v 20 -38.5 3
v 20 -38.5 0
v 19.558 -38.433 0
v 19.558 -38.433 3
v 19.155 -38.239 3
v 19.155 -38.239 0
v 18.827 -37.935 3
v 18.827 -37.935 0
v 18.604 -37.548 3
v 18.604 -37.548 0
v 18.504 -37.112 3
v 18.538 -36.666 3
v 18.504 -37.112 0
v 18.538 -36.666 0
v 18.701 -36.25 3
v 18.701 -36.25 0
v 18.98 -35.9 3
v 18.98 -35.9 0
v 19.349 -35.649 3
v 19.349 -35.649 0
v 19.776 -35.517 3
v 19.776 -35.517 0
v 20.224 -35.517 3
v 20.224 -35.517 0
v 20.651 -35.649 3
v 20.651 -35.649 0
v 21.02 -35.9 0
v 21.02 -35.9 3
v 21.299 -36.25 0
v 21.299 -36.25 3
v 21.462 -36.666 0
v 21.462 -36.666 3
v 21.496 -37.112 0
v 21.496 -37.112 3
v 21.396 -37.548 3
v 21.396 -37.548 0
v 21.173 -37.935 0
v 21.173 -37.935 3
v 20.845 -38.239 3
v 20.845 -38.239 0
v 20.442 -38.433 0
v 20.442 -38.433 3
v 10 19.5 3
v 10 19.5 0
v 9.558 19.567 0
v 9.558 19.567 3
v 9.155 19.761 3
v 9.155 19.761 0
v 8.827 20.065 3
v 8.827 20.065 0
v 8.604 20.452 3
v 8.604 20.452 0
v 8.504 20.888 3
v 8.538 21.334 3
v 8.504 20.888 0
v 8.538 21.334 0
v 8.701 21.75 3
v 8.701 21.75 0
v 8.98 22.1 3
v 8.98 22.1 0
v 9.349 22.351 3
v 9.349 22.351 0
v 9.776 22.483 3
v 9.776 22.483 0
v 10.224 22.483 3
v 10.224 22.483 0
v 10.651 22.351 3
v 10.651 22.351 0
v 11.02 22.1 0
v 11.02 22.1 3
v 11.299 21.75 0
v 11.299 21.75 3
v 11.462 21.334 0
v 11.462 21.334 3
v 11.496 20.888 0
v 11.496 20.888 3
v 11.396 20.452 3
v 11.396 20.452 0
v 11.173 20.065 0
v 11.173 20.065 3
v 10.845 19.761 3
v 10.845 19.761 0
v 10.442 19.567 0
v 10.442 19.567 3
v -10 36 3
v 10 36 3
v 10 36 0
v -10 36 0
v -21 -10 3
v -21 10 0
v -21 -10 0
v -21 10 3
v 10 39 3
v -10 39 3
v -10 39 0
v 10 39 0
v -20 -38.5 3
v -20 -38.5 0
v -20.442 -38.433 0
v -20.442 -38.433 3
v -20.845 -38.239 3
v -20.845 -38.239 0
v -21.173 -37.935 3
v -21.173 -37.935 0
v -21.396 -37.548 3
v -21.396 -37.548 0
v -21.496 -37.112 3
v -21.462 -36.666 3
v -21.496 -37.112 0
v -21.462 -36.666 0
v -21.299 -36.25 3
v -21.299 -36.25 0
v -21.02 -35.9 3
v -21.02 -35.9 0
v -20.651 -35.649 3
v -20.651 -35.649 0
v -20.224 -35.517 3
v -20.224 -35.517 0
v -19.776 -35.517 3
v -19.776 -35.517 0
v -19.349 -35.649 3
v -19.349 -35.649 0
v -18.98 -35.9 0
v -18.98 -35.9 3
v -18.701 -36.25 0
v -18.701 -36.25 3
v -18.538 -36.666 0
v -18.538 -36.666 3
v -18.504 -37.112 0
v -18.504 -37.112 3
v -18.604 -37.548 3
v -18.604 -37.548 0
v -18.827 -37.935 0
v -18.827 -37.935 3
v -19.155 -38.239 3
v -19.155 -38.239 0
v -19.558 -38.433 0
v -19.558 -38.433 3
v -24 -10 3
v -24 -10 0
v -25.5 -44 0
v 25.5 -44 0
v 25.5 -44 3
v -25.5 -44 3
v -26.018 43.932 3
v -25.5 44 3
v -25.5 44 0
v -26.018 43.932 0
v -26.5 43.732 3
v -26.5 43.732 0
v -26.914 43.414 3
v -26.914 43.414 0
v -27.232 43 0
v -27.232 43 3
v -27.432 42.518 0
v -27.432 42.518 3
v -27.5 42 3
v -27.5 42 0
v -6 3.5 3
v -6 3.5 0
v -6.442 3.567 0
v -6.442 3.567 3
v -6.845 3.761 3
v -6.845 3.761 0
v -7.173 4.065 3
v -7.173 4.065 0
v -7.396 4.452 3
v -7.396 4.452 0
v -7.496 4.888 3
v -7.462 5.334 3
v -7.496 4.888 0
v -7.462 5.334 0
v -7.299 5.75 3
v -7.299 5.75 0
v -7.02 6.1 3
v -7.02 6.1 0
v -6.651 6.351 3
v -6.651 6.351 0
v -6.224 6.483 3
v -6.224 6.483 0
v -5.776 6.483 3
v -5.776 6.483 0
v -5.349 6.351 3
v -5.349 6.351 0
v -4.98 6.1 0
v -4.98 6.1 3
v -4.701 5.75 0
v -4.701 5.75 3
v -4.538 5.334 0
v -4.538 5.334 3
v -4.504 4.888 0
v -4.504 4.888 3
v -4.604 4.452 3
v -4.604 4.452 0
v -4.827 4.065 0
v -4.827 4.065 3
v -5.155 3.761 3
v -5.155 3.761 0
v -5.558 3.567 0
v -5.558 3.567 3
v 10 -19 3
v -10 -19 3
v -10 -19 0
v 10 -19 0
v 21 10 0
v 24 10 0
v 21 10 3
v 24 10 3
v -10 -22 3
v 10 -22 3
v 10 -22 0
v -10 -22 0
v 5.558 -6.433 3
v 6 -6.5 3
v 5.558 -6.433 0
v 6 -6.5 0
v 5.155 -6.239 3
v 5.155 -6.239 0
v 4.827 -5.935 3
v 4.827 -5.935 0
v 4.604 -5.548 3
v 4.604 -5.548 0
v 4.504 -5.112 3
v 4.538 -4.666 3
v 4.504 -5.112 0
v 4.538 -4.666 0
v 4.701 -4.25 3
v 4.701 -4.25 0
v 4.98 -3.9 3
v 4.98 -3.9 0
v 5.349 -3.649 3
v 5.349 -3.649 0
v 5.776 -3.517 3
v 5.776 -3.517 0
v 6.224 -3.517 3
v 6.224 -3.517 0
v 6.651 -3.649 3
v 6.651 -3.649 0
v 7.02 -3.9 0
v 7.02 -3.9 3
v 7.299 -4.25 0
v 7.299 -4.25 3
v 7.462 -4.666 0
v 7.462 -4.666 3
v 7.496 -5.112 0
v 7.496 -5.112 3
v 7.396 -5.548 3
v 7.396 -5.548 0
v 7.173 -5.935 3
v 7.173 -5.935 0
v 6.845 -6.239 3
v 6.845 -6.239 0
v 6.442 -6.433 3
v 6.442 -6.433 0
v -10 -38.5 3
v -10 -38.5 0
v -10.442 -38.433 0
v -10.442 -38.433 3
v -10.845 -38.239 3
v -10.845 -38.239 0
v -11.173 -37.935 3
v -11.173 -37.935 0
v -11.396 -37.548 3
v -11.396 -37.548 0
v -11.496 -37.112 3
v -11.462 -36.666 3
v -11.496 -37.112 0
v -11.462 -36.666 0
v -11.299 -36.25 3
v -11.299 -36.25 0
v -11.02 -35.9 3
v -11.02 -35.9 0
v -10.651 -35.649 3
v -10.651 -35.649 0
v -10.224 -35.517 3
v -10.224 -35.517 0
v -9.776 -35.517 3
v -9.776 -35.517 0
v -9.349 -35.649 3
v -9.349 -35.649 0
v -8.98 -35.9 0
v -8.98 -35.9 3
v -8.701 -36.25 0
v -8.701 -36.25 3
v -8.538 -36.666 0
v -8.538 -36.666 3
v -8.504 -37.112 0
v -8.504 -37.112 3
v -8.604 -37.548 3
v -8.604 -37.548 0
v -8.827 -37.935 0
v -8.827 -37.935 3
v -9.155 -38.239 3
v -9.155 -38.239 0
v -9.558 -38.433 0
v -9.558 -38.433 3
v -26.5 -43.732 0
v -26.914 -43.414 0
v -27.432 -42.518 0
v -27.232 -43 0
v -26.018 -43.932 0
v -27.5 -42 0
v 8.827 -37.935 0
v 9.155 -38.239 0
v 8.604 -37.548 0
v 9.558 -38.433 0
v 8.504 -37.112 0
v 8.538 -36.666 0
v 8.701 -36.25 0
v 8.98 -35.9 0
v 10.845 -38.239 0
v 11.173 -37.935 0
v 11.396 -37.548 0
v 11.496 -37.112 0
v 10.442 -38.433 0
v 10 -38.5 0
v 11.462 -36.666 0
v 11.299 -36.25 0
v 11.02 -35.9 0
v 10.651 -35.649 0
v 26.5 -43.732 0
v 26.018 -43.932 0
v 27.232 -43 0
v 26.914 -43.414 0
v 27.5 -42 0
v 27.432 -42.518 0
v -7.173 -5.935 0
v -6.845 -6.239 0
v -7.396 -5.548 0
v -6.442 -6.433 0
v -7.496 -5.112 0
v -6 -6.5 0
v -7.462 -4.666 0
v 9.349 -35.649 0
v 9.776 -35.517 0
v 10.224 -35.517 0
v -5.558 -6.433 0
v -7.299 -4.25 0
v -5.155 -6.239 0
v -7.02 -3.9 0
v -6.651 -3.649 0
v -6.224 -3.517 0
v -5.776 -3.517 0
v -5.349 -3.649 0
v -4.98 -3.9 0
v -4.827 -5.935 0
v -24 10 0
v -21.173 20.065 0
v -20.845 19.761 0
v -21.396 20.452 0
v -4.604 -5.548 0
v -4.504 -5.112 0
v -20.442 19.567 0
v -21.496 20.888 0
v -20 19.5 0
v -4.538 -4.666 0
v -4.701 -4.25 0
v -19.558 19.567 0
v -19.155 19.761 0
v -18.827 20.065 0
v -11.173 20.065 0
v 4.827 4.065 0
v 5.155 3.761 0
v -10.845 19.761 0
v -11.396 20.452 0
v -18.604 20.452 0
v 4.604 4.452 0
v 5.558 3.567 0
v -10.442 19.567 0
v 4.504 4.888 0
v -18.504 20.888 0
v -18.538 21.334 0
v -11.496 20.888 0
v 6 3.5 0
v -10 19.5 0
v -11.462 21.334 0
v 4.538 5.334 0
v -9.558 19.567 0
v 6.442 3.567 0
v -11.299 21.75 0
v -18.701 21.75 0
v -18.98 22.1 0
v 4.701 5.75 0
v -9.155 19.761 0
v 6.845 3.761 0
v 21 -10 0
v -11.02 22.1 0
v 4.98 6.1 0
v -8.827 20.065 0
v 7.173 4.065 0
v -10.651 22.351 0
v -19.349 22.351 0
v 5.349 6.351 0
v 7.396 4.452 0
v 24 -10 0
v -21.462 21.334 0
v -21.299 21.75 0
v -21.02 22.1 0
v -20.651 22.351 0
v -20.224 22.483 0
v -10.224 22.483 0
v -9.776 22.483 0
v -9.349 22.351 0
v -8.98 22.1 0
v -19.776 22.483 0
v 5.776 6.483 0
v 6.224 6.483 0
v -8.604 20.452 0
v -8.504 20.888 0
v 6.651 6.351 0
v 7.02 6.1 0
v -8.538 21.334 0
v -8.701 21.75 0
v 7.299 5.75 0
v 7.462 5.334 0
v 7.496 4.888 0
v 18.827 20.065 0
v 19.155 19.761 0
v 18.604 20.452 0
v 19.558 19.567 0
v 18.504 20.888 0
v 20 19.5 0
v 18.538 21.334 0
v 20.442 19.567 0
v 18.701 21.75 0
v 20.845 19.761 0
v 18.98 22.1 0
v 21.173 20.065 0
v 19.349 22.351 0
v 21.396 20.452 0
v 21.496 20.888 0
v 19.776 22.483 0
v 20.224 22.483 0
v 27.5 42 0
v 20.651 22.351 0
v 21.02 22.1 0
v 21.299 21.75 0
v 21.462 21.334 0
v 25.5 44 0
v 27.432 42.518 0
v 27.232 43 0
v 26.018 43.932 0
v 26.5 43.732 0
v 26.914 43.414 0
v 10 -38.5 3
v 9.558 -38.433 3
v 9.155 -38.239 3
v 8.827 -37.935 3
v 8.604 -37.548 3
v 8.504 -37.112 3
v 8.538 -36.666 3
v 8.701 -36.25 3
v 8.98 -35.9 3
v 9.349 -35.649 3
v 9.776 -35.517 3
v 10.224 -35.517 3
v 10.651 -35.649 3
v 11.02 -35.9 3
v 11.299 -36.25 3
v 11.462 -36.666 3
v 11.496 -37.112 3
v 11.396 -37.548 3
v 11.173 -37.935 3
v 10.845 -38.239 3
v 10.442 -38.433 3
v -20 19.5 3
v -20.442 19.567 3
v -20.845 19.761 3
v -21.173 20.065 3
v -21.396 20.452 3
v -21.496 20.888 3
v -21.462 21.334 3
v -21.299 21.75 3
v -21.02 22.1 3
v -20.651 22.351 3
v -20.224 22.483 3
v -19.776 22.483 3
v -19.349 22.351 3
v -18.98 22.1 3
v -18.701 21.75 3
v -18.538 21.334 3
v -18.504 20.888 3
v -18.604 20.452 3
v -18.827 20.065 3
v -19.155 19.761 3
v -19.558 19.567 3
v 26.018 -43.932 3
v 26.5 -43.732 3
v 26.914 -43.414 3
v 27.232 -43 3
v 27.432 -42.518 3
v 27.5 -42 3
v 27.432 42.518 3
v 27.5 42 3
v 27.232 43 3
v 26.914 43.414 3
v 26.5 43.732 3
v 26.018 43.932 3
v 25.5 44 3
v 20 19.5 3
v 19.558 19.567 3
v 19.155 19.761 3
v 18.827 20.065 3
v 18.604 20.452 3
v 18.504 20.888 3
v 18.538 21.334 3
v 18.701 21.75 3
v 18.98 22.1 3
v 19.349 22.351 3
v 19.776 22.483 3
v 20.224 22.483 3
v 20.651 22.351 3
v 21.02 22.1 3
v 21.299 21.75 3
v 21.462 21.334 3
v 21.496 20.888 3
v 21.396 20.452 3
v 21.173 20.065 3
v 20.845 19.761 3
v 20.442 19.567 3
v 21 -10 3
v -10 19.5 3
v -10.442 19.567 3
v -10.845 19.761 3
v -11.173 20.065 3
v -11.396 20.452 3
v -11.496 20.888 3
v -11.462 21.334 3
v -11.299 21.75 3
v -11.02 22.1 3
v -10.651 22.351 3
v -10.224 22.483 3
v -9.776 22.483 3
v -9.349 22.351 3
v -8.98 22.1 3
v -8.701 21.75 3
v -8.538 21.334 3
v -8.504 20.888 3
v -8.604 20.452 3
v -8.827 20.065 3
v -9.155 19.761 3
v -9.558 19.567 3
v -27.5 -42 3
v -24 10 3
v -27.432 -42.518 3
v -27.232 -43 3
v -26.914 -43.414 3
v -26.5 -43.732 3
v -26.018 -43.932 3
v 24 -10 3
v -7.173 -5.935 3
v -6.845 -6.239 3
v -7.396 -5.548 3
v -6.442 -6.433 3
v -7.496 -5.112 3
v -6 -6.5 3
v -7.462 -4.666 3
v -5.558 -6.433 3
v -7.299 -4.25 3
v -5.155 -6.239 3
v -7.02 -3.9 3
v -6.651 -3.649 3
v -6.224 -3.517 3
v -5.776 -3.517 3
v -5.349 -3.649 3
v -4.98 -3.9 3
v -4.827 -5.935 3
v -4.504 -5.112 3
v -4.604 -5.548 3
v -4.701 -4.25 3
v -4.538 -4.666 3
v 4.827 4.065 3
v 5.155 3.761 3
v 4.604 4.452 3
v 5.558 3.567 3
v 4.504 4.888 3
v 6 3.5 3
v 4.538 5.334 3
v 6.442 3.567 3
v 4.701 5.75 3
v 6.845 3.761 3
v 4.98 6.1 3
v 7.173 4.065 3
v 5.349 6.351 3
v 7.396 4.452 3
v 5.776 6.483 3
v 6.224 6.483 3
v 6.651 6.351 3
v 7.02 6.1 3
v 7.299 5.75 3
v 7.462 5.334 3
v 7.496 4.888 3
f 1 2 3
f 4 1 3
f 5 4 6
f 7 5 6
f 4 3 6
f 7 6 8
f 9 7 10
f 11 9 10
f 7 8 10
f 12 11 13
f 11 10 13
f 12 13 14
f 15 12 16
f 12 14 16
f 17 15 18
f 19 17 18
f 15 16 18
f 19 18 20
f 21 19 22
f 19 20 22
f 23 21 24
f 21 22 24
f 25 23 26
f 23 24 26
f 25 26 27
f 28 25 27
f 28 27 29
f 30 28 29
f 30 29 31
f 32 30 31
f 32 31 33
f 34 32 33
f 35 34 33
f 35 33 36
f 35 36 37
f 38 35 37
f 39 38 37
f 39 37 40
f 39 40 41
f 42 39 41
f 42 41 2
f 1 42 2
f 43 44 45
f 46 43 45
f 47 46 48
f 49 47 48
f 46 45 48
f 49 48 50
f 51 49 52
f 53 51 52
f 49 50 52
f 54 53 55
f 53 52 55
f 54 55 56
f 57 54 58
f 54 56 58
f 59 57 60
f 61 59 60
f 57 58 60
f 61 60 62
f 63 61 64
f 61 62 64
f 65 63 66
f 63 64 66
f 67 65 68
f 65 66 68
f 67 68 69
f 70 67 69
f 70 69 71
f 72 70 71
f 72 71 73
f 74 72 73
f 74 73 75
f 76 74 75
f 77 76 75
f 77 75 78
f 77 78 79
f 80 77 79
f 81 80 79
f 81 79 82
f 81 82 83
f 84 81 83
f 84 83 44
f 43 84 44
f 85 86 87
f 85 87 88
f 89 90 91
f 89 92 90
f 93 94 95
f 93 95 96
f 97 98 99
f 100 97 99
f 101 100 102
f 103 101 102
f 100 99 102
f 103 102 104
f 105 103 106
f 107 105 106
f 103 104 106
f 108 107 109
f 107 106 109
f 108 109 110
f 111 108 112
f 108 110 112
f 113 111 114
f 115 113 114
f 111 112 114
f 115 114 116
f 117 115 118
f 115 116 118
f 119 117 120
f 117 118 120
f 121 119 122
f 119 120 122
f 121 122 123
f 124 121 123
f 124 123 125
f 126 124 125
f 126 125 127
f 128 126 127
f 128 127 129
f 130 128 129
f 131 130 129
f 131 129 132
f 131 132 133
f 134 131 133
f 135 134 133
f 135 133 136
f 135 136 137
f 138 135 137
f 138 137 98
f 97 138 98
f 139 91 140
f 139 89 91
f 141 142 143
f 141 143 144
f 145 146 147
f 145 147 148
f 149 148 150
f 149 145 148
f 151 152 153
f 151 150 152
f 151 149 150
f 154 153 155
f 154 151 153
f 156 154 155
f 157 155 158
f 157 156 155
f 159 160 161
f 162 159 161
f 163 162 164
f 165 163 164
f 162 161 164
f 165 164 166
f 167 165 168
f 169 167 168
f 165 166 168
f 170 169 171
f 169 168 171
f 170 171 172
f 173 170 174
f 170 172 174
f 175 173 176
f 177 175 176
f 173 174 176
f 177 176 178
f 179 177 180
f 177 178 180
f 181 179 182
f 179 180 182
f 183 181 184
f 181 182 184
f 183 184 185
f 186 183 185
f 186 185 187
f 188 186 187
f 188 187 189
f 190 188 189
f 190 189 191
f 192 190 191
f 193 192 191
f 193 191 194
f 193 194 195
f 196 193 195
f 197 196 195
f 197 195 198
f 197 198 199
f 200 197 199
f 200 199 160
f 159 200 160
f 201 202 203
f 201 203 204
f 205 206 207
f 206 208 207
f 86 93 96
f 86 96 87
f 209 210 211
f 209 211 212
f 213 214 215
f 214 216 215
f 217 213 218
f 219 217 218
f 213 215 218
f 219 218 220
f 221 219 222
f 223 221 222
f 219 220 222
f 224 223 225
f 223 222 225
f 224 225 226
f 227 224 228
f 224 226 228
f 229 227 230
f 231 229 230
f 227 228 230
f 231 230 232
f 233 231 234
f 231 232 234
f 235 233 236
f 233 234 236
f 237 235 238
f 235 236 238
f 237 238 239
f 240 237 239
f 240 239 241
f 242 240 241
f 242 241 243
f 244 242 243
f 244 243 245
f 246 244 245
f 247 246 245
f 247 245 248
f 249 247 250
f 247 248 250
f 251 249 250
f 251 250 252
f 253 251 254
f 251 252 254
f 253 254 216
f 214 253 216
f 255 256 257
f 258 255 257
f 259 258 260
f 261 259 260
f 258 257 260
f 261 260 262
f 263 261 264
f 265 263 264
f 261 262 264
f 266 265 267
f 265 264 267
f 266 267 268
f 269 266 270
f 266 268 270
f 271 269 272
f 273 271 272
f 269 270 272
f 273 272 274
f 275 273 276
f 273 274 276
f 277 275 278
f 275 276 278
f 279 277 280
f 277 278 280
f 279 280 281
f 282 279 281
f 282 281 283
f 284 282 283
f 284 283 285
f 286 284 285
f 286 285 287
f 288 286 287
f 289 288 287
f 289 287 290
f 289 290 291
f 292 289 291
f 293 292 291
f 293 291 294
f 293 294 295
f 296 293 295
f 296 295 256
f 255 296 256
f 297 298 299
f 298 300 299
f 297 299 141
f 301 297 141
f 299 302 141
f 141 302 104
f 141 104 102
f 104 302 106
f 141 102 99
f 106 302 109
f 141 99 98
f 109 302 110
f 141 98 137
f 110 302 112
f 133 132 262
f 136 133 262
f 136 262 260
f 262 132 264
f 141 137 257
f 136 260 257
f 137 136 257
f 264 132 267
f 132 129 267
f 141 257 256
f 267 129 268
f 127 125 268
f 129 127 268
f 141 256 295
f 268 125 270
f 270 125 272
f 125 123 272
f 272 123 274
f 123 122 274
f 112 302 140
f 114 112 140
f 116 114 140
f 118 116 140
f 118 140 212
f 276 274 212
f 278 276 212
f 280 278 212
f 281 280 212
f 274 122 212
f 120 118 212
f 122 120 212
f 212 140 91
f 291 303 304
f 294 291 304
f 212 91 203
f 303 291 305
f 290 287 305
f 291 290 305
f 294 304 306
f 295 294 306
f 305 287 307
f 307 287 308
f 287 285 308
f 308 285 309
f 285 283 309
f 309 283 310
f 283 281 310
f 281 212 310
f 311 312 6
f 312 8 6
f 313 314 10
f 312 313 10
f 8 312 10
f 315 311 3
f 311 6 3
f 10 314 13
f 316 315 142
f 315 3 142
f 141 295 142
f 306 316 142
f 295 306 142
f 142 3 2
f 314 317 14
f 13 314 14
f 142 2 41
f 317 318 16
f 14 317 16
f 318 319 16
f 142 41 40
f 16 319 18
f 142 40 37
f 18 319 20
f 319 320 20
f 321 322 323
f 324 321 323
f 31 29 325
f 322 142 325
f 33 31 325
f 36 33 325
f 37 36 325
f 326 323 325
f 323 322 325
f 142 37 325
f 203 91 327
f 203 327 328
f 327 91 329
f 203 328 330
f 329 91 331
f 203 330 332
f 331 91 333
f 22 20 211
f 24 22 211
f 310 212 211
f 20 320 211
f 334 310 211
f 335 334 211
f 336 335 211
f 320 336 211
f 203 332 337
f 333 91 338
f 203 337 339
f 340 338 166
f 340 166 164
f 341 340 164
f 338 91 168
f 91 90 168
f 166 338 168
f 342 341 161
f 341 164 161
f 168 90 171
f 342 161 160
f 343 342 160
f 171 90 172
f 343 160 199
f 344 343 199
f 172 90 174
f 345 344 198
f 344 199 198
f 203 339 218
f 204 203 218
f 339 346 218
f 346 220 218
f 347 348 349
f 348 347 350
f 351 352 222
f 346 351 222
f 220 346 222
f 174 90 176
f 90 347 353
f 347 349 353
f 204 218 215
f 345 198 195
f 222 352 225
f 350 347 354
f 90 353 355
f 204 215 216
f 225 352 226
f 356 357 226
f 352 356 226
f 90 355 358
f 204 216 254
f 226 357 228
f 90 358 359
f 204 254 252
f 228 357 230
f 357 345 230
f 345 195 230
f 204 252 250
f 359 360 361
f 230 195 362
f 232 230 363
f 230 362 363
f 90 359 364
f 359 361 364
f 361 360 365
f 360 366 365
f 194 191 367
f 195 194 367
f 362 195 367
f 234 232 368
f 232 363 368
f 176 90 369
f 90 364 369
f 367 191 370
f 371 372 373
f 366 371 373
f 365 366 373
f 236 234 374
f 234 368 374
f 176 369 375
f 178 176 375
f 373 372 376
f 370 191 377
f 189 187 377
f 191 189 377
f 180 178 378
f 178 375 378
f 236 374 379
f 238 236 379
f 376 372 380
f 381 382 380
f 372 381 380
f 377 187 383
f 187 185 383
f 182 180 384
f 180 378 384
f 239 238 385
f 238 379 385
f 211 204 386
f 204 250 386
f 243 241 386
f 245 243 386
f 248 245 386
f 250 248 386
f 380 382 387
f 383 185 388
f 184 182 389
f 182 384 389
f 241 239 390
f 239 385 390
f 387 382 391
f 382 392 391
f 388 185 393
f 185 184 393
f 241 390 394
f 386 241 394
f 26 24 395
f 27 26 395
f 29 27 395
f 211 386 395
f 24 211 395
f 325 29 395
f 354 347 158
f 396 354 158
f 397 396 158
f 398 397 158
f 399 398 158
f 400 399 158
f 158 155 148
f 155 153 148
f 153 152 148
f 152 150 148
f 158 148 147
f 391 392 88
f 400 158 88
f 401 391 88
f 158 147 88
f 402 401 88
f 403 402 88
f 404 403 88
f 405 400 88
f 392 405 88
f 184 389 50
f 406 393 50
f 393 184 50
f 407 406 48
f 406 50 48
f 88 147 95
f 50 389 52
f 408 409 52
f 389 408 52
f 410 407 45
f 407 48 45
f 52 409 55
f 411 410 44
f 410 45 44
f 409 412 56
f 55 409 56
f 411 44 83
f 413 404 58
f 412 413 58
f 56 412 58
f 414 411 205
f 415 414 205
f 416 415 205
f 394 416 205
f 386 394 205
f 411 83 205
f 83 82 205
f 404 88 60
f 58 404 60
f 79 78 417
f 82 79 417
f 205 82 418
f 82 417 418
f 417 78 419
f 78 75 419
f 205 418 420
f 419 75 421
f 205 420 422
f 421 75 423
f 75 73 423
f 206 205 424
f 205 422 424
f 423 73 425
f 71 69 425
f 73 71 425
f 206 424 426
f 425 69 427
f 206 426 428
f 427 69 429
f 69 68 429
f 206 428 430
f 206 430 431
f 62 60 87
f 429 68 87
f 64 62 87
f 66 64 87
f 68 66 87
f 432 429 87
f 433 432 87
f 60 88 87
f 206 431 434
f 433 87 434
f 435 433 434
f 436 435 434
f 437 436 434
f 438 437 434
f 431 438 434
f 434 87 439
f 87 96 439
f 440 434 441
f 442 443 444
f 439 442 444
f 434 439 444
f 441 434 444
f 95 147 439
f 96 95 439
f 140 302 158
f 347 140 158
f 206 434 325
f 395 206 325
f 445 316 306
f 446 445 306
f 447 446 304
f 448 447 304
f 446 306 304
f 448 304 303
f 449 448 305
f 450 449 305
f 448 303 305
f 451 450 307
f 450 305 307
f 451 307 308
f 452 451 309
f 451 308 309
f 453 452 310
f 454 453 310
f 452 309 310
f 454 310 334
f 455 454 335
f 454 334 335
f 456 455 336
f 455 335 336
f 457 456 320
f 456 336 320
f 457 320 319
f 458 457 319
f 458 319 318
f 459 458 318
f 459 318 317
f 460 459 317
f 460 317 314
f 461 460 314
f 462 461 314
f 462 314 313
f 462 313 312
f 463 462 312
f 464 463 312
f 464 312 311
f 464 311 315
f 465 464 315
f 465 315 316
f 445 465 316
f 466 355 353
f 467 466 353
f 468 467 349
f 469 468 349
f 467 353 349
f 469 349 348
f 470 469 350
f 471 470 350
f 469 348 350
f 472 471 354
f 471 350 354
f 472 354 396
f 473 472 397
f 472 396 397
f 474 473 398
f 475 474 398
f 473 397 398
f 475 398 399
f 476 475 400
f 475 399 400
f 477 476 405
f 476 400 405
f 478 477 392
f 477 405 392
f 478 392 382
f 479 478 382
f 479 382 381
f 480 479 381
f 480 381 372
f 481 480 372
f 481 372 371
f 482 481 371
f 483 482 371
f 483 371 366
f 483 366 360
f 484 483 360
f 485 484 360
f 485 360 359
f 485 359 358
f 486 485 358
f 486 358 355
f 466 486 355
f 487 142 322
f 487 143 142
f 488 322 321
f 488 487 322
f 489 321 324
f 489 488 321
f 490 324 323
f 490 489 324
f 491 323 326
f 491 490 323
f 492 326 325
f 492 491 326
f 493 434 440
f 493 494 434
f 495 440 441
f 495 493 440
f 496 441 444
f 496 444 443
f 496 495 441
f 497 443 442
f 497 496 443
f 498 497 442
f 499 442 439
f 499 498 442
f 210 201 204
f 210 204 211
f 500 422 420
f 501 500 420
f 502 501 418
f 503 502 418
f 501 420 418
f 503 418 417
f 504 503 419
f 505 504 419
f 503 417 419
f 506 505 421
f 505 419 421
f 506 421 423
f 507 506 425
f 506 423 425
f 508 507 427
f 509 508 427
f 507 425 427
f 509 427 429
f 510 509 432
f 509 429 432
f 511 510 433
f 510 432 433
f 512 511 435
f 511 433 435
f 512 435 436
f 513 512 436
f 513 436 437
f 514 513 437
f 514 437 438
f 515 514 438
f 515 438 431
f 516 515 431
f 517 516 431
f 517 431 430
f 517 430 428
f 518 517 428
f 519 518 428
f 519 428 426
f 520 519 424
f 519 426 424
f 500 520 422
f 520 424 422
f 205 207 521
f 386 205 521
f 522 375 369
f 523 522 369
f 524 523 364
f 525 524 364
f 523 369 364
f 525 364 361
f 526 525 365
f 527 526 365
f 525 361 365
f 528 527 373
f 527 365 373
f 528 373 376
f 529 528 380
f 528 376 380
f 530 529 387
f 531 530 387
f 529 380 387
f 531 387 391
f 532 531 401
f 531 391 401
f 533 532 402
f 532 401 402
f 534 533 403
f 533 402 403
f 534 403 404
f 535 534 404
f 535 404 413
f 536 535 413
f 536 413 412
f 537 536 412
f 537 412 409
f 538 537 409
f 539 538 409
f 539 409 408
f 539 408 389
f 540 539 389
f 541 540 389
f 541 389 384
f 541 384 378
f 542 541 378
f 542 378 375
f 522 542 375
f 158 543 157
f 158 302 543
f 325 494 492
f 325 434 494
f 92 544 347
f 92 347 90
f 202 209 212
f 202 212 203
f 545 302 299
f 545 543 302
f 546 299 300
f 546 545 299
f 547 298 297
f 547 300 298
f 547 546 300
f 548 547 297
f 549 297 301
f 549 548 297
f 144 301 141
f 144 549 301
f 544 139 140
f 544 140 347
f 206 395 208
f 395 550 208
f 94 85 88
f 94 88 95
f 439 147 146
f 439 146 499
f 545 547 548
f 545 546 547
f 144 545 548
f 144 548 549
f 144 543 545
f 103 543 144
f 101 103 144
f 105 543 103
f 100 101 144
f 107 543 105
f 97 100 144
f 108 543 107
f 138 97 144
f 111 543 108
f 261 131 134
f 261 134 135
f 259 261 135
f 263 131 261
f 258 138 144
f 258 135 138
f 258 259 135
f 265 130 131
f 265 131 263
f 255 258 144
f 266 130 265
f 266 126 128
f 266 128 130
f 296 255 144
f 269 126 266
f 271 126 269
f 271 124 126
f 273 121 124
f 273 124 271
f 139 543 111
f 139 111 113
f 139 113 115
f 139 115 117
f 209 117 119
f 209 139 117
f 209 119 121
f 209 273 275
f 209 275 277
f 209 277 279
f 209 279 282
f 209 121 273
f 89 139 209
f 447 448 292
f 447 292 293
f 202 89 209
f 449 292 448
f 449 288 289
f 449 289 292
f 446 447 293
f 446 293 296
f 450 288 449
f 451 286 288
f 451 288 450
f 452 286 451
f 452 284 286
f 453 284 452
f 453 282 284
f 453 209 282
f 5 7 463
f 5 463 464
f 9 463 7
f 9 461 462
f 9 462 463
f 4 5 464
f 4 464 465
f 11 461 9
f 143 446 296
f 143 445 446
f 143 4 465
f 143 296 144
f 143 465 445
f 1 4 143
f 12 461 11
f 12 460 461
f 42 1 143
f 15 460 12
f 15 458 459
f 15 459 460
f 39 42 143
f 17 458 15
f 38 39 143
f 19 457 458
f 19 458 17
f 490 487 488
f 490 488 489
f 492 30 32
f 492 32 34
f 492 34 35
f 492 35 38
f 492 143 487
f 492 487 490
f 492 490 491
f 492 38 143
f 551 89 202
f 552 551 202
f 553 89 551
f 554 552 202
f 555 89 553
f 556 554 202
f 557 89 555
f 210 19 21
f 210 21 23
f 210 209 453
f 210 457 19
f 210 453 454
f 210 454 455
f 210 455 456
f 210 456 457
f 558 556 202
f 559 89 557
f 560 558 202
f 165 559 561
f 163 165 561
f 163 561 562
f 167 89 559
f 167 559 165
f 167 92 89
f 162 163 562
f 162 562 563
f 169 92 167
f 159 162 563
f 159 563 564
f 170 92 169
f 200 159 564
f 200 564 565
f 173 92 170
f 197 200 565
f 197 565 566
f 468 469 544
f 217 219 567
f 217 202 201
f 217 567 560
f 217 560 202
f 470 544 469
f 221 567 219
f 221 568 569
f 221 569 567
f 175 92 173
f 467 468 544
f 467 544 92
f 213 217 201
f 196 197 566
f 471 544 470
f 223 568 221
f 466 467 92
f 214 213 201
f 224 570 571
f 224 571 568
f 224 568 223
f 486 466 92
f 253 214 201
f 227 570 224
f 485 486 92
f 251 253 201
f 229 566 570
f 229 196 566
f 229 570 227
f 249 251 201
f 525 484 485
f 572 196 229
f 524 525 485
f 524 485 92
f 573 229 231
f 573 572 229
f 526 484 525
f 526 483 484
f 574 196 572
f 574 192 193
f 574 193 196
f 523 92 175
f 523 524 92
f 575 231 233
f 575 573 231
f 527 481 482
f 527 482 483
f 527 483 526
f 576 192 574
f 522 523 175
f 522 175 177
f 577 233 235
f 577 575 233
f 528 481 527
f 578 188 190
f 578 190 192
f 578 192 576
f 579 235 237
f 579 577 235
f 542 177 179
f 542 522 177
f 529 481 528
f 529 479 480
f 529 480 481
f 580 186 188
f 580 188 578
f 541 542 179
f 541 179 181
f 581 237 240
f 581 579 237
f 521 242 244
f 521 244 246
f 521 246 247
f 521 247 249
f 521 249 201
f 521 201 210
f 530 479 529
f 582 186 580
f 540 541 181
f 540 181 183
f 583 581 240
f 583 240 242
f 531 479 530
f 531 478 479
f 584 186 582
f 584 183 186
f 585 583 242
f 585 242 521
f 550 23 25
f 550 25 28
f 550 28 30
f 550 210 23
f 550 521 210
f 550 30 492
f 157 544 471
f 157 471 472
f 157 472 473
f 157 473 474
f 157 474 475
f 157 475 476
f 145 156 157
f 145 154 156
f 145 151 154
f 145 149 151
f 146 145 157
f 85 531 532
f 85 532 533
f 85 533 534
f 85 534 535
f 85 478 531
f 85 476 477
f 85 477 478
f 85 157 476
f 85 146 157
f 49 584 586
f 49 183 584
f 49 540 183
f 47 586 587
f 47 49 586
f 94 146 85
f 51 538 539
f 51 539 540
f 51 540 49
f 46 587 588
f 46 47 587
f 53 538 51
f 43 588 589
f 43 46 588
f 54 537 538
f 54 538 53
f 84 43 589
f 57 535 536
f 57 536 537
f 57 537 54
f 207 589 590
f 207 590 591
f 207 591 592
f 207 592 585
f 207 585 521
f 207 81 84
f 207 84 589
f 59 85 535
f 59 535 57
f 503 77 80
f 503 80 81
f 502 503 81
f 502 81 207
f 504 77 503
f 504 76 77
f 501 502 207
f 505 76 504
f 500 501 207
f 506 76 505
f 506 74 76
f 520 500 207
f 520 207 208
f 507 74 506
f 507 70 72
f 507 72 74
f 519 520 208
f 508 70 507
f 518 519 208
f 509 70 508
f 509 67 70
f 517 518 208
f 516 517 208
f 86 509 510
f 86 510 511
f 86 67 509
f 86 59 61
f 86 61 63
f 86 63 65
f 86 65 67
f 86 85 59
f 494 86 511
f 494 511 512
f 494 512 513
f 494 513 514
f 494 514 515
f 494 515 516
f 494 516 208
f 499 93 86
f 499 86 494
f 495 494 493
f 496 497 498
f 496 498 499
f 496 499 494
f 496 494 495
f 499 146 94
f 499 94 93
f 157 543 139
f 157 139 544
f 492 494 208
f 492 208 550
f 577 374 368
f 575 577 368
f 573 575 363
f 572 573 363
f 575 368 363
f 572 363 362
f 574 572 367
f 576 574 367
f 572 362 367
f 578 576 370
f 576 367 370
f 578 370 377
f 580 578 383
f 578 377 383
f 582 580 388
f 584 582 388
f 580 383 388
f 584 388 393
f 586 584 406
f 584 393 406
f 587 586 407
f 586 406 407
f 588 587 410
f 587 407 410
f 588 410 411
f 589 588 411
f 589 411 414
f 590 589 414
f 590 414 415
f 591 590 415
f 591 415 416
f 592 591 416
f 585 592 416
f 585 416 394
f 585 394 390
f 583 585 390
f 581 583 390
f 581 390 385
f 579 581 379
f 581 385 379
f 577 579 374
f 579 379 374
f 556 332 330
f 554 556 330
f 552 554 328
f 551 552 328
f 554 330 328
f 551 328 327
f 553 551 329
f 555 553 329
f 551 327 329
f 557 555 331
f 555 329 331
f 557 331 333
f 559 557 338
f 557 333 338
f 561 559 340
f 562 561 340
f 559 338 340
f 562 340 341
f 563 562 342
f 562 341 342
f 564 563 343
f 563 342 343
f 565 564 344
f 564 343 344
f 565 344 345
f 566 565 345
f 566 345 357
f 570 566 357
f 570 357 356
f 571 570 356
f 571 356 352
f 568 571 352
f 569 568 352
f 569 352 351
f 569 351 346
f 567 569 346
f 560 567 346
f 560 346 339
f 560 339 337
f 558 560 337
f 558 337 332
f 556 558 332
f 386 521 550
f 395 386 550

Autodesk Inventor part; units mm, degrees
ref_plane "XZ Plane" through (0, 0, 0) normal (0, 1, 0) x (-1, 0, 0)
ref_plane "XY Plane" through (0, 0, 0) normal (0, 0, 1) x (1, 0, 0)
sketch "Boceto1" plane through (0, 0, 0) normal (0, 0, 1) x (1, 0, 0)
  line L0 (27.5, -44) -> (-27.5, -44)
  line L1 (-27.5, -44) -> (-27.5, 44)
  line L2 (-27.5, 44) -> (27.5, 44)
  line L3 (27.5, 44) -> (27.5, -44)
  line L4 (27.5, -44) -> (-27.5, 44) construction
  line L5 (-27.5, -44) -> (27.5, 44) construction
  point P0 (0, 0)
  dimension "d0" = 55
  dimension "d1" = 88
extrude "Extrusión1" add sketch "Boceto1" along normal blind 3
sketch "Boceto2" plane through (0, 0, 3) normal (0, 0, 1) x (1, 0, 0)
  line L0 (0, 61.6) -> (0, -61.6) construction
  line L1 (-27.5, -44) -> (27.5, -44) construction
  line L2 (27.5, 44) -> (-27.5, 44) construction
  point P0 (0, 0)
  point P1 (-20, -37)
  point P2 (-10, -37)
  point P3 (20, -37)
  point P4 (10, -37)
  point P5 (-20, 21)
  point P6 (-10, 21)
  point P7 (20, 21)
  point P8 (10, 21)
  dimension "d4" = 10
  dimension "d5" = 0
  dimension "d7" = 10
  dimension "d8" = 7
  dimension "d22" = 23
  dimension "d23" = 10
  dimension "d24" = 0
  dimension "d25" = 10
hole "Agujero1" at (-20, -37, 3) at (-10, -37, 3) at (20, -37, 3) at (10, -37, 3) at (-20, 21, 3) at (-10, 21, 3) at (10, 21, 3) at (20, 21, 3) direction (0, 0, -1) diameter 3 end through all
sketch "Boceto3" plane through (0, 0, 3) normal (0, 0, 1) x (1, 0, 0)
  line L0 (10, -22) -> (-10, -22)
  line L1 (-10, -22) -> (-10, -19)
  line L2 (-10, -19) -> (10, -19)
  line L3 (10, -19) -> (10, -22)
  line L4 (10, -22) -> (-10, -19) construction
  line L5 (-10, -22) -> (10, -19) construction
  line L6 (0, 61.6) -> (0, -61.6) construction
  circle A0 centre (-10, -37) radius 1.5 construction
  line L7 (10, 36) -> (-10, 36)
  line L8 (-10, 36) -> (-10, 39)
  line L9 (-10, 39) -> (10, 39)
  line L10 (10, 39) -> (10, 36)
  line L11 (10, 36) -> (-10, 39) construction
  line L12 (-10, 36) -> (10, 39) construction
  circle A1 centre (-10, 21) radius 1.5 construction
  point P0 (0, 0)
  point P1 (0, -20.5)
  point P2 (0, 37.5)
  point P3 (0, 36)
  dimension "d16" = 3
  dimension "d17" = 20
  dimension "d21" = 15
  dimension "d26" = 3
  dimension "d27" = 20
  dimension "d28" = 15
extrude "Extrusión2" cut sketch "Boceto3" against normal through all
fillet "Empalme1" radius 2 4 edges at (-27.5, -44, 1.5) (27.5, -44, 1.5) (27.5, 44, 1.5) (-27.5, 44, 1.5)
sketch "Boceto5" plane through (0, 0, 3) normal (0, 0, 1) x (1, 0, 0)
  circle A0 centre (-6, 5) radius 1.6 construction
  circle A1 centre (-6, -5) radius 1.6 construction
  circle A2 centre (6, -5) radius 1.6 construction
  circle A3 centre (6, 5) radius 1.6 construction
hole "Agujero2" at (-6, 5, 3) at (-6, -5, 3) at (6, -5, 3) at (6, 5, 3) direction (0, 0, -1) diameter 3 end through all
sketch "Boceto6" plane through (0, 0, 3) normal (0, 0, 1) x (1, 0, 0)
  line L0 (-21, -10) -> (-24, -10)
  line L1 (-24, -10) -> (-24, 10)
  line L2 (-24, 10) -> (-21, 10)
  line L3 (-21, 10) -> (-21, -10)
  line L4 (-38.5, 0) -> (38.5, 0) construction
  line L5 (0, 61.6) -> (0, -61.6) construction
  line L6 (21, -10) -> (24, -10)
  line L7 (24, -10) -> (24, 10)
  line L8 (24, 10) -> (21, 10)
  line L9 (21, 10) -> (21, -10)
  line L10 (-21, 14) -> (-21, -14) construction
  point P0 (0, 0)
  point P1 (-24, 0)
  point P2 (22, -14)
  point P3 (24, 0)
  dimension "d37" = 20
  dimension "d38" = 3
extrude "Extrusión3" cut sketch "Boceto6" against normal through all
properties part number "PlacaFrontalSTD"
